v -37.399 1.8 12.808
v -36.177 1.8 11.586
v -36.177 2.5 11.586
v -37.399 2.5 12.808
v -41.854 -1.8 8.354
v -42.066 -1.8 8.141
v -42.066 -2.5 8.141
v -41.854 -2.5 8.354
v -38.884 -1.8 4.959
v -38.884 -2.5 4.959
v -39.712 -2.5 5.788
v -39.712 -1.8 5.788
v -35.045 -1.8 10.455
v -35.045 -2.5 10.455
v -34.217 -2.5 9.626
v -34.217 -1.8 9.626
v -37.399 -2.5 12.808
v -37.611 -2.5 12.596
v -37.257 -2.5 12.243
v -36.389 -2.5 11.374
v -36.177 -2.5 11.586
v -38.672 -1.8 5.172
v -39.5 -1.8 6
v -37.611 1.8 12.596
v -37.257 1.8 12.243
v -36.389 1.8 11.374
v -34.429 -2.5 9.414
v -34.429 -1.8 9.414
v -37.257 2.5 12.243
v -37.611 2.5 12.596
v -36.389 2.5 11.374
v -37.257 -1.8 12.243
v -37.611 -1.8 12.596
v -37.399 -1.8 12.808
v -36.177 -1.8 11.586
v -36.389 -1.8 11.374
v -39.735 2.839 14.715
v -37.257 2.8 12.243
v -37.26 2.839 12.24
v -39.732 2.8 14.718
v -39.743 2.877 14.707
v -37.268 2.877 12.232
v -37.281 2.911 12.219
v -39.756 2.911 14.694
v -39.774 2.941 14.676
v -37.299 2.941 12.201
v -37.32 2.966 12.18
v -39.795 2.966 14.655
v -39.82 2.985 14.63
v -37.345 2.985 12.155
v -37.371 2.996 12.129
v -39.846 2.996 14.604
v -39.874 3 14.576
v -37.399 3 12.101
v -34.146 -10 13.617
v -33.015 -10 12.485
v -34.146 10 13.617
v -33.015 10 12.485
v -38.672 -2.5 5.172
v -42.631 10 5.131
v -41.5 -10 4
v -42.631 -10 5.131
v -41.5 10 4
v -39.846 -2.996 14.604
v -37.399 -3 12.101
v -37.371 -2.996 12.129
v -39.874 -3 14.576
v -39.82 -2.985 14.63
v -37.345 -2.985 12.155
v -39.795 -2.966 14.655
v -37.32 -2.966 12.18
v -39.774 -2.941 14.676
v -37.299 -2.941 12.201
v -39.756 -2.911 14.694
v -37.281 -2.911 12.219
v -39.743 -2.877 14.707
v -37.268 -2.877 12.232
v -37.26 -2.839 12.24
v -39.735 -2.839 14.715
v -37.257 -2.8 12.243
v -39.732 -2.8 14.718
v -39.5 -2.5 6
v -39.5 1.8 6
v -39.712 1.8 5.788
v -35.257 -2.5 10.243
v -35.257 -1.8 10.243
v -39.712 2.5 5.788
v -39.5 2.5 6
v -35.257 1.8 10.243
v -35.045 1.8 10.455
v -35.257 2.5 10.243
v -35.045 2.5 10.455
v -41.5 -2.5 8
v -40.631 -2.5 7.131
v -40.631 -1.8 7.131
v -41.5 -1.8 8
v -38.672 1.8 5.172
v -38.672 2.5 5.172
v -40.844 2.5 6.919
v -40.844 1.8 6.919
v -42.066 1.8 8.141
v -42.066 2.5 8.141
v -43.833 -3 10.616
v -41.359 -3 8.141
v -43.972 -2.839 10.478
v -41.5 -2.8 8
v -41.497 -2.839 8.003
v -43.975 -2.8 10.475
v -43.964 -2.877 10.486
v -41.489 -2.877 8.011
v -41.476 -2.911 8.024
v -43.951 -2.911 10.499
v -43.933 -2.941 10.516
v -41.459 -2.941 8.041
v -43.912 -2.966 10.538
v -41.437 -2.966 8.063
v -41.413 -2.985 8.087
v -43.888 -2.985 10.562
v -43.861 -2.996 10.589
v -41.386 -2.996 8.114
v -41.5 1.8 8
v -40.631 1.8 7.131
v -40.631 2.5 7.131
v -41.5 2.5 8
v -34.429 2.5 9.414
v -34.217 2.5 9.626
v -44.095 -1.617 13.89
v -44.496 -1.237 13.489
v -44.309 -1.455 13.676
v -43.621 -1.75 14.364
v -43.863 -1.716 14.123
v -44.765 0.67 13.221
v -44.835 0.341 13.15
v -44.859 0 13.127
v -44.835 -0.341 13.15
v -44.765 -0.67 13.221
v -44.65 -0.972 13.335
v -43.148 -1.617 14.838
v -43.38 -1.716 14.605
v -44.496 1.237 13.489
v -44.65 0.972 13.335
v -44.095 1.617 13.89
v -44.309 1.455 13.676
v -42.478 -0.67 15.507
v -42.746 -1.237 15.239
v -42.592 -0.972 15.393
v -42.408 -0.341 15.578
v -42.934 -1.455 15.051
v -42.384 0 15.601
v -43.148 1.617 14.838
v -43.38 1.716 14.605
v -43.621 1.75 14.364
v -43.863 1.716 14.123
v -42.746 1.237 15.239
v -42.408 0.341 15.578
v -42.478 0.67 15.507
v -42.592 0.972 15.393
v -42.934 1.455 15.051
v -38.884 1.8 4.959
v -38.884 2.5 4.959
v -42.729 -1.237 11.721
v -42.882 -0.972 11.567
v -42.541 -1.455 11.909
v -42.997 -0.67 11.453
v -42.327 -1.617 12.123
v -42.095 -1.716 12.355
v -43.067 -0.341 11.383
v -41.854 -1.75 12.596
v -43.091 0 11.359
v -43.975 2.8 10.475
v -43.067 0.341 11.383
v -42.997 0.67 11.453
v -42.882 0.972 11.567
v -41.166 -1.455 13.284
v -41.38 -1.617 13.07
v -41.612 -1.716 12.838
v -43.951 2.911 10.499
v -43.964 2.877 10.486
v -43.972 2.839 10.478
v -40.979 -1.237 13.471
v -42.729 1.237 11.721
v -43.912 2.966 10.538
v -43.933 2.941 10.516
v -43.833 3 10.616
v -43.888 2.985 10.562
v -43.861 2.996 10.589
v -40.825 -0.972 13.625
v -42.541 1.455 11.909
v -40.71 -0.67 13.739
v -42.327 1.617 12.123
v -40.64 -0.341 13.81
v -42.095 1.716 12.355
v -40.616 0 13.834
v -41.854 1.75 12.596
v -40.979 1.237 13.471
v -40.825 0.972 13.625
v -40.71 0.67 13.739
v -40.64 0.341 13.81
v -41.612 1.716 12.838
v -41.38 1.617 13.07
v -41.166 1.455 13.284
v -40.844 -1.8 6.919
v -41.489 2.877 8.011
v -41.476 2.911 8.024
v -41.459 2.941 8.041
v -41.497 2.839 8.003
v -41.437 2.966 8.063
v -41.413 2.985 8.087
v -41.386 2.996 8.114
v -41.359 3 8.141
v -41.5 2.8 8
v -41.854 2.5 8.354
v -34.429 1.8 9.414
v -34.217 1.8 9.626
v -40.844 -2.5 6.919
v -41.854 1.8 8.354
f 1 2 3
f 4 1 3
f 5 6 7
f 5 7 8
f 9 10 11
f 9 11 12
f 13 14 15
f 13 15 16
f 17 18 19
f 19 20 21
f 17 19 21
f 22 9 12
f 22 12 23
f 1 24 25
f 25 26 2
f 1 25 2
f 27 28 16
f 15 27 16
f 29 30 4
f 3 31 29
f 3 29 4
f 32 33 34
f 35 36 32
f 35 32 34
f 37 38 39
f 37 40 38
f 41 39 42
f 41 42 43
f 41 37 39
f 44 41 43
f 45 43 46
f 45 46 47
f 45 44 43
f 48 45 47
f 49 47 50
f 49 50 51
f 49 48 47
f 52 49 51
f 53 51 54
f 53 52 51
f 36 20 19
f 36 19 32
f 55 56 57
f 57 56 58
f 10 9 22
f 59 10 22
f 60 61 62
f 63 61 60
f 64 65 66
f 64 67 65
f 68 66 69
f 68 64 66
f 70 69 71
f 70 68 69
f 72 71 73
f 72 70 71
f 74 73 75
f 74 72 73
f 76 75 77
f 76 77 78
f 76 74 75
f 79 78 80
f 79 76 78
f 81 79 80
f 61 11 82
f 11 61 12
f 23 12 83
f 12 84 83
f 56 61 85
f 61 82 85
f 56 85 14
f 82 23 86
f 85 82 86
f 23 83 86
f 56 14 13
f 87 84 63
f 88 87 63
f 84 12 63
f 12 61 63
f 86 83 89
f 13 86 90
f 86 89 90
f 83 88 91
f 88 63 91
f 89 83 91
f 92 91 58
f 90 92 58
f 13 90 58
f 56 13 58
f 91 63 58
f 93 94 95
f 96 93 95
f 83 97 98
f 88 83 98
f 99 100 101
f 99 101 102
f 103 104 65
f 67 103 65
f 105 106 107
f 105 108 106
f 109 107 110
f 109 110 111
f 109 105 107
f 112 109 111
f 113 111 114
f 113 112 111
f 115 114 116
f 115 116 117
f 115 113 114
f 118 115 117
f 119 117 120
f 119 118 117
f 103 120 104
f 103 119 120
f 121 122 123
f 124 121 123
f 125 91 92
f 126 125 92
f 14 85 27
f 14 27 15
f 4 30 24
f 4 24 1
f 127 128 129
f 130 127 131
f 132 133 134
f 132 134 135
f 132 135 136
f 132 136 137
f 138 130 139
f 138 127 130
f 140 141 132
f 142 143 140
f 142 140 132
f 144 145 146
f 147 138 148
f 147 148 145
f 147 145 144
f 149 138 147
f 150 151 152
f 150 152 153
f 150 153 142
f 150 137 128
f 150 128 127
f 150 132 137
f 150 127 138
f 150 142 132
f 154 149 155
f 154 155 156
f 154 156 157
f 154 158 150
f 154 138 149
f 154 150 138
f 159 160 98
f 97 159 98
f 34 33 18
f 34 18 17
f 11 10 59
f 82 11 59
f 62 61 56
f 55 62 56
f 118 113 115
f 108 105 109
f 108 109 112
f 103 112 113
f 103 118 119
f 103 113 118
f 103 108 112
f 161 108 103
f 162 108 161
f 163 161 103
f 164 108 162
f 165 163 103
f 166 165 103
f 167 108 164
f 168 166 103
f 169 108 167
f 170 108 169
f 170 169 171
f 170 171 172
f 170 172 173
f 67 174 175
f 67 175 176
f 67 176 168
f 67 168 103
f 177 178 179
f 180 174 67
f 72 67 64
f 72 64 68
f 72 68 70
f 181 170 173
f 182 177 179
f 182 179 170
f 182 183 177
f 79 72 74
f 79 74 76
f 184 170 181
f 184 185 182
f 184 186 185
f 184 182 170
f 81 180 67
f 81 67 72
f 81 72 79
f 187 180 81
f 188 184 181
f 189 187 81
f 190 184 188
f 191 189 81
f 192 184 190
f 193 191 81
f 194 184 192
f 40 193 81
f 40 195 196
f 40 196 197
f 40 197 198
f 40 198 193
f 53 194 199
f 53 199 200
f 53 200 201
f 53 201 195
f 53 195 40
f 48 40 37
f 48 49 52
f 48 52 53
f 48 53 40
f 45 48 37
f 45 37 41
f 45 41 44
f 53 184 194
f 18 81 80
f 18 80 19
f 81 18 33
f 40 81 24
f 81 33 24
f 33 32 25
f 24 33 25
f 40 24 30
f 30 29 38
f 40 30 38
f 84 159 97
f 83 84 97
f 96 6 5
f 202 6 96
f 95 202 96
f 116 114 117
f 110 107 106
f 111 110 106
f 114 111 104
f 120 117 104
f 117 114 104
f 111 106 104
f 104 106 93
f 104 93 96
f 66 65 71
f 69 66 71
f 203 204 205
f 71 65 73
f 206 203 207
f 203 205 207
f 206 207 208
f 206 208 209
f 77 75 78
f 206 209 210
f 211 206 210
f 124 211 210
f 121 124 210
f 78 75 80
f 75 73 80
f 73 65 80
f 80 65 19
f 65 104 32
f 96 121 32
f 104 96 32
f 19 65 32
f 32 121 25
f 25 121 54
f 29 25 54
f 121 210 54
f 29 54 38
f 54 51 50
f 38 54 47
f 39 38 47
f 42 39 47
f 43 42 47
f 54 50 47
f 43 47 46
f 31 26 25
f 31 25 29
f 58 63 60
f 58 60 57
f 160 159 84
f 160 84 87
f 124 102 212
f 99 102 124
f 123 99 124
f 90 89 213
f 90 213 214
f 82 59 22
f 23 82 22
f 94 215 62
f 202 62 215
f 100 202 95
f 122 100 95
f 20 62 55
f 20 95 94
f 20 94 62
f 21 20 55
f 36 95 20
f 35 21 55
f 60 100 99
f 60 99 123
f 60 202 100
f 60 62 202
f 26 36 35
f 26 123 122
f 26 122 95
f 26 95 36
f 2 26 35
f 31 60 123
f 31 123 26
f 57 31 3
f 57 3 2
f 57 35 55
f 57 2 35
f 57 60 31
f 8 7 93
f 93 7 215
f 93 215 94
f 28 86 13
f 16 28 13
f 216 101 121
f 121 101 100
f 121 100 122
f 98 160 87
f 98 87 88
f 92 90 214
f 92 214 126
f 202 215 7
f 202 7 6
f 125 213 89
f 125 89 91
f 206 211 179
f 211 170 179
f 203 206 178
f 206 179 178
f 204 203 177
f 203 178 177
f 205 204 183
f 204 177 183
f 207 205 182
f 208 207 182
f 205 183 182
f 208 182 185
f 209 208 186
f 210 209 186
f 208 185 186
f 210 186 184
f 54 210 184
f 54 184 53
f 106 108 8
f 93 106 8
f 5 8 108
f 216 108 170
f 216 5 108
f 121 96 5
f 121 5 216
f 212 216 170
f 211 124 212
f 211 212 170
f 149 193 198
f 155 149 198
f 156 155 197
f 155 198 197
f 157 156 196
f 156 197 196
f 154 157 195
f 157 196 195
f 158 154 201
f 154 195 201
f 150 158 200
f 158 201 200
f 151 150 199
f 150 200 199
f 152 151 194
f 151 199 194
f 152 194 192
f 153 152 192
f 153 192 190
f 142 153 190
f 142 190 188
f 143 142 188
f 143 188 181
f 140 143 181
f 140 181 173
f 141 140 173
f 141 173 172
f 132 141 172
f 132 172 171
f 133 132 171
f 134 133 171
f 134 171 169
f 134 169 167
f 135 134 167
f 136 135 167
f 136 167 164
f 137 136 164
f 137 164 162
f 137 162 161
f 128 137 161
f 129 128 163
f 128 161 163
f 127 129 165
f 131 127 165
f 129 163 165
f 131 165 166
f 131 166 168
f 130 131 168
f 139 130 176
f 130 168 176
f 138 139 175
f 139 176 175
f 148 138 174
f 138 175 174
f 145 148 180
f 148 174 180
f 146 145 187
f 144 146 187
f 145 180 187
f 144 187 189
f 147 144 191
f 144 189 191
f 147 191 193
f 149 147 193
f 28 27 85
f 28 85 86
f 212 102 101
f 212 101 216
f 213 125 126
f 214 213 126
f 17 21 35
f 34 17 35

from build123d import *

# Parameters (mm, degrees)
BOX026_W              = 12
BOX026_H              = 20
BOX026_DEPTH          = 1.6
BOX026_PITCH_ANGLE    = -45
BOX024_W              = 0.3
BOX024_H              = 0.7
BOX024_DEPTH          = 4.5
BOX021_W              = 0.3
BOX021_H              = 0.7
BOX021_DEPTH          = 4.5
BOX025_W              = 0.3
BOX025_H              = 0.7
BOX025_DEPTH          = 4.5
BOX022_W              = 0.3
BOX022_H              = 0.7
BOX022_DEPTH          = 4.5
CYLINDER042_R         = 1.75
CYLINDER042_DEPTH     = 6
BOX023_W              = 6
BOX023_H              = 6
BOX023_DEPTH          = 3.5
FILLET004_R           = 0.2
FUSION004_PITCH_ANGLE = -45


with BuildPart() as plaqueta_pulsador:
    # Box026 → Box026 (new body)
    with BuildSketch(Plane.XY):
        with Locations((6, 10)):
            Rectangle(BOX026_W, BOX026_H)
    extrude(amount=BOX026_DEPTH)


with BuildPart() as plaqueta_pulsador_1:
    # Box026 pitch: moved
    add(plaqueta_pulsador.part.rotate(Axis((0, 0, 0), (0, 1, 0)), BOX026_PITCH_ANGLE))


with BuildPart() as plaqueta_pulsador_2:
    # Box026 placement: moved
    add(plaqueta_pulsador_1.part.moved(Location((-43, -10, 4))))


with BuildPart() as cubo021:
    # Box024 → Box024 (new body)
    with BuildSketch(Plane(origin=(6, 0.5, -4), x_dir=(1, 0, 0), z_dir=(0, 0, 1))):
        with Locations((0.15, 0.35)):
            Rectangle(BOX024_W, BOX024_H)
    extrude(amount=BOX024_DEPTH)


with BuildPart() as cubo018:
    # Box021 → Box021 (new body)
    with BuildSketch(Plane(origin=(6, 4.8, -4), x_dir=(1, 0, 0), z_dir=(0, 0, 1))):
        with Locations((0.15, 0.35)):
            Rectangle(BOX021_W, BOX021_H)
    extrude(amount=BOX021_DEPTH)


with BuildPart() as cubo022:
    # Box025 → Box025 (new body)
    with BuildSketch(Plane(origin=(-0.3, 4.8, -4), x_dir=(1, 0, 0), z_dir=(0, 0, 1))):
        with Locations((0.15, 0.35)):
            Rectangle(BOX025_W, BOX025_H)
    extrude(amount=BOX025_DEPTH)


with BuildPart() as cubo019:
    # Box022 → Box022 (new body)
    with BuildSketch(Plane(origin=(-0.3, 0.5, -4), x_dir=(1, 0, 0), z_dir=(0, 0, 1))):
        with Locations((0.15, 0.35)):
            Rectangle(BOX022_W, BOX022_H)
    extrude(amount=BOX022_DEPTH)


with BuildPart() as cilindro018:
    # Cylinder042 → Cylinder042 (new body)
    with BuildSketch(Plane(origin=(3, 3, 0), x_dir=(1, 0, 0), z_dir=(0, 0, 1))):
        Circle(CYLINDER042_R)
    extrude(amount=CYLINDER042_DEPTH)


with BuildPart() as plaqueta_con_pulsador:
    # Box023 → Box023 (new body)
    with BuildSketch(Plane.XY):
        with Locations((3, 3)):
            Rectangle(BOX023_W, BOX023_H)
    extrude(amount=BOX023_DEPTH)

    # Fillet004
    fillet004_edges = [plaqueta_con_pulsador.edges().sort_by_distance(p)[0] for p in [
        (0, 0, 1.75),
        (0, 6, 1.75),
        (6, 0, 1.75),
        (6, 6, 1.75),
    ]]
    fillet(fillet004_edges, radius=FILLET004_R)

    # Fusion004: union Cubo021, Cubo018, Cubo022, Cubo019, Cilindro018
    add(cubo021.part)
    add(cubo018.part)
    add(cubo022.part)
    add(cubo019.part)
    add(cilindro018.part)


with BuildPart() as plaqueta_con_pulsador_1:
    # Fusion004 pitch: moved
    add(plaqueta_con_pulsador.part.rotate(Axis((0, 0, 0), (0, 1, 0)), FUSION004_PITCH_ANGLE))


with BuildPart() as plaqueta_con_pulsador_2:
    # Fusion004 placement: moved
    add(plaqueta_con_pulsador_1.part.moved(Location((-43, -3, 8))))

    # Fusion005: union plaqueta pulsador
    add(plaqueta_pulsador_2.part)


with BuildPart() as plaqueta_con_pulsador_3:
    # Fusion005 placement: moved
    add(plaqueta_con_pulsador_2.part.moved(Location((1.5, 0, 0))))


solid = plaqueta_con_pulsador_3.part
